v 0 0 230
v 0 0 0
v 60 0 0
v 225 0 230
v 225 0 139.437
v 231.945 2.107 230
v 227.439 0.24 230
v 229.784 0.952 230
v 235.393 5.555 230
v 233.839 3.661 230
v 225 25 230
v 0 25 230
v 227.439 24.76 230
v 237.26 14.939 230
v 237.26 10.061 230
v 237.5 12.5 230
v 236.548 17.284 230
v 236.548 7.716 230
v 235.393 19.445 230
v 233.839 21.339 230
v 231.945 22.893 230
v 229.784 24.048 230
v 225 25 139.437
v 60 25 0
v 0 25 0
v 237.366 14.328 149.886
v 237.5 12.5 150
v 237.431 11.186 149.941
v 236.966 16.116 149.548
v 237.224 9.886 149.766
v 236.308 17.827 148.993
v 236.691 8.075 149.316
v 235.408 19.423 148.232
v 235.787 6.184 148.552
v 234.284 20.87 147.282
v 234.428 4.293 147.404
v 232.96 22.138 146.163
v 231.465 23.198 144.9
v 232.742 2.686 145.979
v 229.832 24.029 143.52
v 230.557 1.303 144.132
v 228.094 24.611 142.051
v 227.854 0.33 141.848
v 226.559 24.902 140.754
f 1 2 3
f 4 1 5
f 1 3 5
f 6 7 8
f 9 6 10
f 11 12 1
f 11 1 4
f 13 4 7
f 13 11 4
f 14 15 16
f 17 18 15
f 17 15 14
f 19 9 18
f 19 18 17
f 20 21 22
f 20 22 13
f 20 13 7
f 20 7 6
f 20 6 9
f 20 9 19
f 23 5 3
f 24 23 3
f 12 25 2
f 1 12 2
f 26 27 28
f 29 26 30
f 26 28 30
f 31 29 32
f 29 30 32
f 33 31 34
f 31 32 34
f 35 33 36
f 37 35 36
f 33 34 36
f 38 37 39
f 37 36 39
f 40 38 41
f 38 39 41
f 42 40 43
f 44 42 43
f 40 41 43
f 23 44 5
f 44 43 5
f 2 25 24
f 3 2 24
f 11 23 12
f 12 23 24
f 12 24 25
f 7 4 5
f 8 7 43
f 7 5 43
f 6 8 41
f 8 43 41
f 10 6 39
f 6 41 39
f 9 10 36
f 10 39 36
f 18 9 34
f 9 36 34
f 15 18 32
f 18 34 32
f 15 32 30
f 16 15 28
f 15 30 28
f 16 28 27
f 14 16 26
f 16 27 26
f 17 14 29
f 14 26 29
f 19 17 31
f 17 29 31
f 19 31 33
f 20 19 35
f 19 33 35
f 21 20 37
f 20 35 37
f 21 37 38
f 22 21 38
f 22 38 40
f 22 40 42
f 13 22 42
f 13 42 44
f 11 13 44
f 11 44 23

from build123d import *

# Parameters (mm, degrees)
F1_DEPTH = 230
F3_DEPTH = 25.001


with BuildPart() as f1:
    # F0 (on Top) → F1 (new body)
    with BuildSketch(Plane.XY):
        with BuildLine():
            Line((0, 25), (0, 0))
            Line((0, 0), (225, 0))
            ThreePointArc((225, 0), (237.5, 12.5), (225, 25))
            Line((225, 25), (0, 25))
        make_face()
    extrude(amount=F1_DEPTH)

    # F2 (on face) → F3 (cut, through all)
    with BuildSketch(Plane.XZ):
        Polygon((237.5, 0), (237.5, 150), (225, 139.43662), (225, 0), align=None)
        Polygon((225, 0), (225, 139.43662), (60, 0), align=None)
    extrude(amount=-F3_DEPTH, mode=Mode.SUBTRACT)


solid = f1.part
